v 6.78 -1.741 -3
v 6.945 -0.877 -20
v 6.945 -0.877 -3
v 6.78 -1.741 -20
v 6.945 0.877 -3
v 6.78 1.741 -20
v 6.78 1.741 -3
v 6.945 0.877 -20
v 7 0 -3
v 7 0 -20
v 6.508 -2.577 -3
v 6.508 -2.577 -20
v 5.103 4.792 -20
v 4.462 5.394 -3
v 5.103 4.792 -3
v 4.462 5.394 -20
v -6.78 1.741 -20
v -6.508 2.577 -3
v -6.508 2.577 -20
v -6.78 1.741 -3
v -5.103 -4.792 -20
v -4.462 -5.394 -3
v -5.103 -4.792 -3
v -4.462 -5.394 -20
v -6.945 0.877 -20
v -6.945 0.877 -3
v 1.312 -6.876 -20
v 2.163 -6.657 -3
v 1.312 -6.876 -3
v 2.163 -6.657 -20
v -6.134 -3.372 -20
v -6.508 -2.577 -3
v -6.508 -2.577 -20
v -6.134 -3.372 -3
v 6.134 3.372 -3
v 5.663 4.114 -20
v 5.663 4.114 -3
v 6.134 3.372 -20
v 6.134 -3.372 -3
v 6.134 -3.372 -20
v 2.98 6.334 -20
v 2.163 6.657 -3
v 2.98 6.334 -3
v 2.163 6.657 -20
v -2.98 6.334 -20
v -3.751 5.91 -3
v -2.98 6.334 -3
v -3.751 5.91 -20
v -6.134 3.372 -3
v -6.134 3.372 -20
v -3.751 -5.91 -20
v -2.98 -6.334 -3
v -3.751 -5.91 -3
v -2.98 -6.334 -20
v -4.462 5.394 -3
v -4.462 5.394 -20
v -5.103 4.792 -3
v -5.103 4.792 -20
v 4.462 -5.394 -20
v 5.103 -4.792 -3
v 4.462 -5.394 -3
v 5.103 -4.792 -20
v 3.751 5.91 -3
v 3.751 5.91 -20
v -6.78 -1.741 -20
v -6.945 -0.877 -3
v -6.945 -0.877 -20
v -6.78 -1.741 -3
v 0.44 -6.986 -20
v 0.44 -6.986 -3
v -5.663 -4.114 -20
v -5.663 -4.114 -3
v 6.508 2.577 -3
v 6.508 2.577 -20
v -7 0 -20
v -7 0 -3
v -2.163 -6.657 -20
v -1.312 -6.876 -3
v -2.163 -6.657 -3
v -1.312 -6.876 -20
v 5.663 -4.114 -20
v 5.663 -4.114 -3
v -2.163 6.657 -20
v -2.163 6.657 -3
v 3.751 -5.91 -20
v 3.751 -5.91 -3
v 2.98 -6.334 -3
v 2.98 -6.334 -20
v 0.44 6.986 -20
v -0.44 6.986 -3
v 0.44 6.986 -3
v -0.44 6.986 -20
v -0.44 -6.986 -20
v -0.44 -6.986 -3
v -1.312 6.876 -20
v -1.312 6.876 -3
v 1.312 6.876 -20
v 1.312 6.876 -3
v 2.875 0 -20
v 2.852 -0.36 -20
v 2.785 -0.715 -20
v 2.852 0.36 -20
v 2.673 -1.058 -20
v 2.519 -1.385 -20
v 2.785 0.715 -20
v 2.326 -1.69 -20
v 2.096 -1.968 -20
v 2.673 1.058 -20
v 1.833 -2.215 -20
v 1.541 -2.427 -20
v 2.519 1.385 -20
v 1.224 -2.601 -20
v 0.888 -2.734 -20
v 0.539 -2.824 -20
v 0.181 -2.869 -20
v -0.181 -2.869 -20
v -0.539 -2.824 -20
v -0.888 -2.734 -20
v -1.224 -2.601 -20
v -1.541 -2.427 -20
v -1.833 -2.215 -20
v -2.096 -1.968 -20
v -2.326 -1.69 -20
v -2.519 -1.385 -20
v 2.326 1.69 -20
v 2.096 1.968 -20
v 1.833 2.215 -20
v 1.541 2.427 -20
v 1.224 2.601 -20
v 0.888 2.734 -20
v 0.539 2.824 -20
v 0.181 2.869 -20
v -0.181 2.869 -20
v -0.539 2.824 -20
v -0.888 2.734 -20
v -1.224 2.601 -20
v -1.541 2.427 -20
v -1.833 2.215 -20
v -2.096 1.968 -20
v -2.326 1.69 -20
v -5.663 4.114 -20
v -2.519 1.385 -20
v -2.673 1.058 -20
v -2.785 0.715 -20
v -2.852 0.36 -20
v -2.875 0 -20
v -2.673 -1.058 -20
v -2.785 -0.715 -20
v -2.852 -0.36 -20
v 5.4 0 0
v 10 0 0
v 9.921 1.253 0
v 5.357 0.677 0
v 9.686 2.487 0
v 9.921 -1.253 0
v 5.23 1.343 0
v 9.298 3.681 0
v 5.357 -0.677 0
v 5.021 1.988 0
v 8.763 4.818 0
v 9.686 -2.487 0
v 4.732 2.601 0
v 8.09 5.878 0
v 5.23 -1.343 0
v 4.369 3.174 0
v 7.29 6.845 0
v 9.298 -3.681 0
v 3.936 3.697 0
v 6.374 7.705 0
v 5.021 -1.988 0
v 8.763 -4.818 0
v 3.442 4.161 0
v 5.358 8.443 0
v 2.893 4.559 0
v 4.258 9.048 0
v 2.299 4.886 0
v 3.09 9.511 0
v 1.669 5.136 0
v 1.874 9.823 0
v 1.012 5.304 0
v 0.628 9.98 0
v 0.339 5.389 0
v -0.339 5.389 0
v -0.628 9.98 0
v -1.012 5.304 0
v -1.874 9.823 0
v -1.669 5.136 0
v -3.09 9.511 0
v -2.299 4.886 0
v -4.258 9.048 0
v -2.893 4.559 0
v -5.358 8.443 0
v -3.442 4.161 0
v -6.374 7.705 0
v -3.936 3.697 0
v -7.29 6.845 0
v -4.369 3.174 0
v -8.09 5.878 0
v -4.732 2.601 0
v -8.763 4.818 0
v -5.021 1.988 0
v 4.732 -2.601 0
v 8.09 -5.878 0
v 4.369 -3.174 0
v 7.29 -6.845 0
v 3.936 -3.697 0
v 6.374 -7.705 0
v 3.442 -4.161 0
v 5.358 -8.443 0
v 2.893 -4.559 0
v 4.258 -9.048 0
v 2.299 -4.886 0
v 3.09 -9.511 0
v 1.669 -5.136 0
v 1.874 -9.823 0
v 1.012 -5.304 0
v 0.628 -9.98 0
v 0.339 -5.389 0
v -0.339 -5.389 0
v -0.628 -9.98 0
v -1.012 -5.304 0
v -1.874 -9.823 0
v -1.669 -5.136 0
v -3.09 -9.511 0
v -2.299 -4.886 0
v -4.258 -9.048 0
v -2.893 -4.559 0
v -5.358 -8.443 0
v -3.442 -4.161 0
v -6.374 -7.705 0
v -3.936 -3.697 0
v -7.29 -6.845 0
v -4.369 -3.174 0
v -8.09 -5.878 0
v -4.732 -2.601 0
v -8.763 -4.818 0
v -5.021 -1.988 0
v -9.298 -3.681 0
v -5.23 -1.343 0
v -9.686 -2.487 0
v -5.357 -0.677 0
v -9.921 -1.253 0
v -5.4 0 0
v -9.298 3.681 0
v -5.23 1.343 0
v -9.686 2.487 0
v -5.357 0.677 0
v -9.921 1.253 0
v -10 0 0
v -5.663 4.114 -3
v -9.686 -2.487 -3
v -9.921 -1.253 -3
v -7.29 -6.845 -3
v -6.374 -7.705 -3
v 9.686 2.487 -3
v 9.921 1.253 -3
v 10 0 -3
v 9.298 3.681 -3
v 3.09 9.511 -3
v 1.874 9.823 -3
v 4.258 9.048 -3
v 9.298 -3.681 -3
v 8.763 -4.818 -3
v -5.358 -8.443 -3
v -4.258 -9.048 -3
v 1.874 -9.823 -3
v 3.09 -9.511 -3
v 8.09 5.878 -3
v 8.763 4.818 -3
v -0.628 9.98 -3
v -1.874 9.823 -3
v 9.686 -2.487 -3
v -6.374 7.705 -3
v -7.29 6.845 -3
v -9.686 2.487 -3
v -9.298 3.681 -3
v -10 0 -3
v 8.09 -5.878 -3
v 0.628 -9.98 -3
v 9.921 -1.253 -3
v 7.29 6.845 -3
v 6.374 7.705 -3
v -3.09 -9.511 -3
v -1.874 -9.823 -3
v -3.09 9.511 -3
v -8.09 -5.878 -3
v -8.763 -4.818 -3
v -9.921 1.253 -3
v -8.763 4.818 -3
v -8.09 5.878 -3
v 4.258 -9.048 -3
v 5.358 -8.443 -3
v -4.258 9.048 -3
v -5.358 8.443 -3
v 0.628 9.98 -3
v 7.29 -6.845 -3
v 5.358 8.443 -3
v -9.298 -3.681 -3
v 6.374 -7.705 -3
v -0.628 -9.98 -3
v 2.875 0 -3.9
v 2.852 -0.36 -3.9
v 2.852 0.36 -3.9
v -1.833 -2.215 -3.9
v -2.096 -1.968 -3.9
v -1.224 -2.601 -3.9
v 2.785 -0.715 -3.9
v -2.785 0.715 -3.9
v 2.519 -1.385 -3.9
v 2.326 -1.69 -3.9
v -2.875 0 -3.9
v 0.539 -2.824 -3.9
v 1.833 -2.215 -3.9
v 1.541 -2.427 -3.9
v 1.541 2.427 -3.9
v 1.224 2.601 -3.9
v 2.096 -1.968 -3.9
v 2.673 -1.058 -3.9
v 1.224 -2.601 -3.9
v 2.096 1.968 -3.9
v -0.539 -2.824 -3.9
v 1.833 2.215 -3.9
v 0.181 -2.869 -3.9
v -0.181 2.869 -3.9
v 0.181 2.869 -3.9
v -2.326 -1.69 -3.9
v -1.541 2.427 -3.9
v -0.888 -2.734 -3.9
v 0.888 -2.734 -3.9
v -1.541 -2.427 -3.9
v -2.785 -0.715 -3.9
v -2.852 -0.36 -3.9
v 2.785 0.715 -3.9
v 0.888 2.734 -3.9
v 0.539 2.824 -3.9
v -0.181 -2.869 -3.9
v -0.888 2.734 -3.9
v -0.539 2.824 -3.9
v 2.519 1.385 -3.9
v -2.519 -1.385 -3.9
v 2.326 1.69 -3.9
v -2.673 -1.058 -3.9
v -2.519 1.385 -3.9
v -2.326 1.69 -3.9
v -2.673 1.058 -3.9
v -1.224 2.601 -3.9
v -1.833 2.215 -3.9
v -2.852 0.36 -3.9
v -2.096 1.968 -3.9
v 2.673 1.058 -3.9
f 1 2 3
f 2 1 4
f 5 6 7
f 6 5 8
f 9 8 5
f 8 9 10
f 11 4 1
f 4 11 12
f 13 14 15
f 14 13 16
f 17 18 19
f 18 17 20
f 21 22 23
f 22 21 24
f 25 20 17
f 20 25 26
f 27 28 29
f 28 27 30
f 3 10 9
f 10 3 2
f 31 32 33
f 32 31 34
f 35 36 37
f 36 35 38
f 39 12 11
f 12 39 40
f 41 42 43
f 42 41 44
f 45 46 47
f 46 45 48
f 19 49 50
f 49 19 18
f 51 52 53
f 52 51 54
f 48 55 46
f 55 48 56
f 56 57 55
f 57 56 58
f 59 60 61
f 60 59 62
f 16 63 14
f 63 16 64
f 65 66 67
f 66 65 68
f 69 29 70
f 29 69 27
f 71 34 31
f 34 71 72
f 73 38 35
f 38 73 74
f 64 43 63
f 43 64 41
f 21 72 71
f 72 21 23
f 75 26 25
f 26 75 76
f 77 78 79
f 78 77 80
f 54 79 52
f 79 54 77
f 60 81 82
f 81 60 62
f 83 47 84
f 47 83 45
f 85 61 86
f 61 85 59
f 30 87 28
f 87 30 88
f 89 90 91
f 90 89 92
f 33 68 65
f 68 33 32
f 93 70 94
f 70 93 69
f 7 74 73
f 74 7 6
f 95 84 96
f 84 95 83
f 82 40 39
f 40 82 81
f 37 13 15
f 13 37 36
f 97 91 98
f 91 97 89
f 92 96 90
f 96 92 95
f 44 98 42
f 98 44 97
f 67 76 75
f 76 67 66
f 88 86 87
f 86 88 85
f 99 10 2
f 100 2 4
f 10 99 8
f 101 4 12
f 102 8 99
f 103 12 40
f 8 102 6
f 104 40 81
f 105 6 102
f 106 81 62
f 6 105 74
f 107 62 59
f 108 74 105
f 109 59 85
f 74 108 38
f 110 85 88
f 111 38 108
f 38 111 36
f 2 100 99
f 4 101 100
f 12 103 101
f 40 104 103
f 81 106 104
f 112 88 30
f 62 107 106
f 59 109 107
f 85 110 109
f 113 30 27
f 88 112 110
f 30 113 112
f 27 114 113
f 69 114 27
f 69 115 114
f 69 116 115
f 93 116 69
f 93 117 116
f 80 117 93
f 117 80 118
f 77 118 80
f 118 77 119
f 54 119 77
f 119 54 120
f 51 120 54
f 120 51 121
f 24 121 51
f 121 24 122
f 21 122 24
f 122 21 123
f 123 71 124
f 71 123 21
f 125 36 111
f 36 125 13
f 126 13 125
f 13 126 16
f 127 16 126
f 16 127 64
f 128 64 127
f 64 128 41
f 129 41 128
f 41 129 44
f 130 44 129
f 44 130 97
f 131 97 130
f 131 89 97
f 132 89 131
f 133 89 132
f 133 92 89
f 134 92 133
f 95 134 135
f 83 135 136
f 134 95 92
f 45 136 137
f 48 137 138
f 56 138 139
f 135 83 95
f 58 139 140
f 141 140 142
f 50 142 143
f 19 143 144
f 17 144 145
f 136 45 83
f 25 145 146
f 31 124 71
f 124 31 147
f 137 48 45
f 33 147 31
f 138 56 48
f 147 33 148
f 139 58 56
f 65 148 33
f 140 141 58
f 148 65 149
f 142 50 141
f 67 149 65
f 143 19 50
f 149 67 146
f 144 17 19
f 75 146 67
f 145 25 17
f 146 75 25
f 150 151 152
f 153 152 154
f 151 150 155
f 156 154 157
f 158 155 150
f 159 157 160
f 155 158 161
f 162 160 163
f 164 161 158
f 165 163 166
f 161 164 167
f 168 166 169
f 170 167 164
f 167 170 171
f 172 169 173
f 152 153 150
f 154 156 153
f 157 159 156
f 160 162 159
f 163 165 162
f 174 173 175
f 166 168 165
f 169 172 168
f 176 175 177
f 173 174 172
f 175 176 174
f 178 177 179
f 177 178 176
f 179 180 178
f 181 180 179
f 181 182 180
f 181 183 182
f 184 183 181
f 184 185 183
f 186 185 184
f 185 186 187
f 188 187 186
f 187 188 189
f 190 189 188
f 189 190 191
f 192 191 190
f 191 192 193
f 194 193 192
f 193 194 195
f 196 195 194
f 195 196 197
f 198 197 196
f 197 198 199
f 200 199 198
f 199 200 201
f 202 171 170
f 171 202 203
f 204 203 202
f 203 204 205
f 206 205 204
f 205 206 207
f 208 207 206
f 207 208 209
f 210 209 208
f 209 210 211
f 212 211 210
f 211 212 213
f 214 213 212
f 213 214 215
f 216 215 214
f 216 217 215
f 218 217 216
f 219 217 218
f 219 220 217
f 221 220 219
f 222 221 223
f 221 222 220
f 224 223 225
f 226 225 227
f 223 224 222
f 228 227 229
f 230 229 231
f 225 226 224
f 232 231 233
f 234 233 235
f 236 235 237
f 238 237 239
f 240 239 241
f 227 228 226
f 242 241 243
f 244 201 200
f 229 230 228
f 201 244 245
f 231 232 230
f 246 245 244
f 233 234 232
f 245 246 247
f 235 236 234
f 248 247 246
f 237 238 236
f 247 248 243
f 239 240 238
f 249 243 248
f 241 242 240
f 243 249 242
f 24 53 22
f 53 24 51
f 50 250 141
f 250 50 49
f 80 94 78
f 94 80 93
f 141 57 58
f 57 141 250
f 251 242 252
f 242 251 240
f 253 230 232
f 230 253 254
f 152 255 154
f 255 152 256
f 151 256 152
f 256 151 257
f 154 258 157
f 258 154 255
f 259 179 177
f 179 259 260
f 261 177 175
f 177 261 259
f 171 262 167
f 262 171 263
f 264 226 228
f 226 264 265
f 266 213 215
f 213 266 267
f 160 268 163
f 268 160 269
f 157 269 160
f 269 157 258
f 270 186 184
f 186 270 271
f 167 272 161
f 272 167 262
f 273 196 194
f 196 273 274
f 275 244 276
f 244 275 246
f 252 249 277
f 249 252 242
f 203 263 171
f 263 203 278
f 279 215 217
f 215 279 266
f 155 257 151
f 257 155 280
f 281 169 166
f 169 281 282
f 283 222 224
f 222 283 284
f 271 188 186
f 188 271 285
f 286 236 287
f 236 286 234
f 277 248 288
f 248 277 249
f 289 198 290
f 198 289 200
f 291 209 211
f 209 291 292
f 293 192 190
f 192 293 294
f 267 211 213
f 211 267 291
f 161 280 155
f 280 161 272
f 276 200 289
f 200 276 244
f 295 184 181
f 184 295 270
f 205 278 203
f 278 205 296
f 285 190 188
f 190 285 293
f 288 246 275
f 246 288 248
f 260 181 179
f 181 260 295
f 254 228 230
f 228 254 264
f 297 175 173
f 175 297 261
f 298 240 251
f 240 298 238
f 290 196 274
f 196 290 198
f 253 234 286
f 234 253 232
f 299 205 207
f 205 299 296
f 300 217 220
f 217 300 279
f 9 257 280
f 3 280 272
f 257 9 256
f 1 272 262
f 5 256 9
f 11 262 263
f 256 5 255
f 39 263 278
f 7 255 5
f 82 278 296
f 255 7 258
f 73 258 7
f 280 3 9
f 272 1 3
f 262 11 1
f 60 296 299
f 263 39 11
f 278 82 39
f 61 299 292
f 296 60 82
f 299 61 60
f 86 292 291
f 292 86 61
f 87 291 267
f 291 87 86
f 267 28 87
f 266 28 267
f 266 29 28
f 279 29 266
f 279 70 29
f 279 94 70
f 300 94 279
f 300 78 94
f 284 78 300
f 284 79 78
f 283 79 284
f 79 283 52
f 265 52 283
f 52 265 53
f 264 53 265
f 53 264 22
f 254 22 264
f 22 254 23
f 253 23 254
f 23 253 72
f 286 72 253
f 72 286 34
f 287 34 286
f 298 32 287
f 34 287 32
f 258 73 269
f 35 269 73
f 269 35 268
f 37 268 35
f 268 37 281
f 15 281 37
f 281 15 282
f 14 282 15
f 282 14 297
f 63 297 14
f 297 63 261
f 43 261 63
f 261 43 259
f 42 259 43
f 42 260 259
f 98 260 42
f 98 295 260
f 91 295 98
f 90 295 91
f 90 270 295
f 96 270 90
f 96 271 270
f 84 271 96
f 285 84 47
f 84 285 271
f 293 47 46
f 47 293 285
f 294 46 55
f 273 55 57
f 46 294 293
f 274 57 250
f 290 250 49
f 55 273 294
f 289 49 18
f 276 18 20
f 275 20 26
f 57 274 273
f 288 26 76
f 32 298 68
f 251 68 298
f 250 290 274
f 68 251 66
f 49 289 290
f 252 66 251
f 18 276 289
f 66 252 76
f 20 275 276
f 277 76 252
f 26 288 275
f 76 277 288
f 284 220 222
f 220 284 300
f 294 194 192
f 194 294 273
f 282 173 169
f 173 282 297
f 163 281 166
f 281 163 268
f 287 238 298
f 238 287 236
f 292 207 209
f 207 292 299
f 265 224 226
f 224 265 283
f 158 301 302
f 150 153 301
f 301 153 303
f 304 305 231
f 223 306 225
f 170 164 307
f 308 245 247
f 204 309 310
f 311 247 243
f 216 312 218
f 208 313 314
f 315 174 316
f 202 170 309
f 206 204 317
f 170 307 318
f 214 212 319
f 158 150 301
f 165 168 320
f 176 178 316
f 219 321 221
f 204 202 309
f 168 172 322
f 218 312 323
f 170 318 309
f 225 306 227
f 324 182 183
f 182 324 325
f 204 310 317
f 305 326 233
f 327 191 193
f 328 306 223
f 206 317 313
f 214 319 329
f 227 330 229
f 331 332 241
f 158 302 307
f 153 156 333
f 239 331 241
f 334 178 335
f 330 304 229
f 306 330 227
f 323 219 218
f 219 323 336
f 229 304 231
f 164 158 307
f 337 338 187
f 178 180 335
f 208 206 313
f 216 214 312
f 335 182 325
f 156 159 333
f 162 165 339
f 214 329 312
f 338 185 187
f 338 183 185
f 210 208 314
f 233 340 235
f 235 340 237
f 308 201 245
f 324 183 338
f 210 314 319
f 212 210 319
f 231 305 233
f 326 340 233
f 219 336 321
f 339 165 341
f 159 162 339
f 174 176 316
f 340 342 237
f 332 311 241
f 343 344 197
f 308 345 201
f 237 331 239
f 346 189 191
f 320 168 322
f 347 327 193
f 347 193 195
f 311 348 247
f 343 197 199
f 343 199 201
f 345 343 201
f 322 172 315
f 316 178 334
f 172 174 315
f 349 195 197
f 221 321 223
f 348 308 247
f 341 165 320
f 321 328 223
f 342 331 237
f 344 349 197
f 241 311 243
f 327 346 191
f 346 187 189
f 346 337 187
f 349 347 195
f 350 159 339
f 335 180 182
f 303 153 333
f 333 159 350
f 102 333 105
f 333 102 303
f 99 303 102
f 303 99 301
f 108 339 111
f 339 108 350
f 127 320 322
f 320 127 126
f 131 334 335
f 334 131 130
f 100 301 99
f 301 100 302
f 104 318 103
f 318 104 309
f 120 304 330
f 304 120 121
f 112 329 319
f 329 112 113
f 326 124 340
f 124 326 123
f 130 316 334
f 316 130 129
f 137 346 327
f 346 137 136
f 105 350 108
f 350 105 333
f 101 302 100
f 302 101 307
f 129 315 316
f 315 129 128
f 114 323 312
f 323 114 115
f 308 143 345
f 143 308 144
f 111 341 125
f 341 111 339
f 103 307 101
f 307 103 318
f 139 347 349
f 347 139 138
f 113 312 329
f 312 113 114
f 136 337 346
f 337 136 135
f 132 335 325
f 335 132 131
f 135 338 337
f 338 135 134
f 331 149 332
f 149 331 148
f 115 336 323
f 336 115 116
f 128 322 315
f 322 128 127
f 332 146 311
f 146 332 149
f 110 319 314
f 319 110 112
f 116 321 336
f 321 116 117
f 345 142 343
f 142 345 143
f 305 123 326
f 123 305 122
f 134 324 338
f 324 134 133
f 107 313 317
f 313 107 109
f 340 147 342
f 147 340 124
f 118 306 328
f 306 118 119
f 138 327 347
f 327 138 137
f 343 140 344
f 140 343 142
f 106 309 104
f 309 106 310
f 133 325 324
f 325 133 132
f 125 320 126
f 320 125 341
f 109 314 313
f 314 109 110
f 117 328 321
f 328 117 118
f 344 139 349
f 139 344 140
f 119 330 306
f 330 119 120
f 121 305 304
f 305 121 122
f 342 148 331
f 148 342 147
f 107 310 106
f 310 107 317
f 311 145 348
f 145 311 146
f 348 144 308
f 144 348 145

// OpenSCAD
$fn = 50;


difference() {
	union() {
		translate(v = [0, 0, -20.0000000000]) {
			cylinder(h = 20, r = 7.0000000000);
		}
		translate(v = [0, 0, -3.0000000000]) {
			cylinder(h = 3, r = 10.0000000000);
		}
	}
	union() {
		translate(v = [0, 0, 0]) {
			rotate(a = [0, 0, 0]) {
				difference() {
					union() {
						#translate(v = [0, 0, -20.0000000000]) {
							cylinder(h = 20, r = 2.6000000000);
						}
						#translate(v = [0, 0, -3.9000000000]) {
							cylinder(h = 3.9000000000, r = 7.0000000000, r1 = 2.8750000000, r2 = 5.4000000000);
						}
						#translate(v = [0, 0, -20.0000000000]) {
							cylinder(h = 20, r = 2.8750000000);
						}
						#translate(v = [0, 0, -20.0000000000]) {
							cylinder(h = 20, r = 2.6000000000);
						}
					}
					union();
				}
			}
		}
	}
}
